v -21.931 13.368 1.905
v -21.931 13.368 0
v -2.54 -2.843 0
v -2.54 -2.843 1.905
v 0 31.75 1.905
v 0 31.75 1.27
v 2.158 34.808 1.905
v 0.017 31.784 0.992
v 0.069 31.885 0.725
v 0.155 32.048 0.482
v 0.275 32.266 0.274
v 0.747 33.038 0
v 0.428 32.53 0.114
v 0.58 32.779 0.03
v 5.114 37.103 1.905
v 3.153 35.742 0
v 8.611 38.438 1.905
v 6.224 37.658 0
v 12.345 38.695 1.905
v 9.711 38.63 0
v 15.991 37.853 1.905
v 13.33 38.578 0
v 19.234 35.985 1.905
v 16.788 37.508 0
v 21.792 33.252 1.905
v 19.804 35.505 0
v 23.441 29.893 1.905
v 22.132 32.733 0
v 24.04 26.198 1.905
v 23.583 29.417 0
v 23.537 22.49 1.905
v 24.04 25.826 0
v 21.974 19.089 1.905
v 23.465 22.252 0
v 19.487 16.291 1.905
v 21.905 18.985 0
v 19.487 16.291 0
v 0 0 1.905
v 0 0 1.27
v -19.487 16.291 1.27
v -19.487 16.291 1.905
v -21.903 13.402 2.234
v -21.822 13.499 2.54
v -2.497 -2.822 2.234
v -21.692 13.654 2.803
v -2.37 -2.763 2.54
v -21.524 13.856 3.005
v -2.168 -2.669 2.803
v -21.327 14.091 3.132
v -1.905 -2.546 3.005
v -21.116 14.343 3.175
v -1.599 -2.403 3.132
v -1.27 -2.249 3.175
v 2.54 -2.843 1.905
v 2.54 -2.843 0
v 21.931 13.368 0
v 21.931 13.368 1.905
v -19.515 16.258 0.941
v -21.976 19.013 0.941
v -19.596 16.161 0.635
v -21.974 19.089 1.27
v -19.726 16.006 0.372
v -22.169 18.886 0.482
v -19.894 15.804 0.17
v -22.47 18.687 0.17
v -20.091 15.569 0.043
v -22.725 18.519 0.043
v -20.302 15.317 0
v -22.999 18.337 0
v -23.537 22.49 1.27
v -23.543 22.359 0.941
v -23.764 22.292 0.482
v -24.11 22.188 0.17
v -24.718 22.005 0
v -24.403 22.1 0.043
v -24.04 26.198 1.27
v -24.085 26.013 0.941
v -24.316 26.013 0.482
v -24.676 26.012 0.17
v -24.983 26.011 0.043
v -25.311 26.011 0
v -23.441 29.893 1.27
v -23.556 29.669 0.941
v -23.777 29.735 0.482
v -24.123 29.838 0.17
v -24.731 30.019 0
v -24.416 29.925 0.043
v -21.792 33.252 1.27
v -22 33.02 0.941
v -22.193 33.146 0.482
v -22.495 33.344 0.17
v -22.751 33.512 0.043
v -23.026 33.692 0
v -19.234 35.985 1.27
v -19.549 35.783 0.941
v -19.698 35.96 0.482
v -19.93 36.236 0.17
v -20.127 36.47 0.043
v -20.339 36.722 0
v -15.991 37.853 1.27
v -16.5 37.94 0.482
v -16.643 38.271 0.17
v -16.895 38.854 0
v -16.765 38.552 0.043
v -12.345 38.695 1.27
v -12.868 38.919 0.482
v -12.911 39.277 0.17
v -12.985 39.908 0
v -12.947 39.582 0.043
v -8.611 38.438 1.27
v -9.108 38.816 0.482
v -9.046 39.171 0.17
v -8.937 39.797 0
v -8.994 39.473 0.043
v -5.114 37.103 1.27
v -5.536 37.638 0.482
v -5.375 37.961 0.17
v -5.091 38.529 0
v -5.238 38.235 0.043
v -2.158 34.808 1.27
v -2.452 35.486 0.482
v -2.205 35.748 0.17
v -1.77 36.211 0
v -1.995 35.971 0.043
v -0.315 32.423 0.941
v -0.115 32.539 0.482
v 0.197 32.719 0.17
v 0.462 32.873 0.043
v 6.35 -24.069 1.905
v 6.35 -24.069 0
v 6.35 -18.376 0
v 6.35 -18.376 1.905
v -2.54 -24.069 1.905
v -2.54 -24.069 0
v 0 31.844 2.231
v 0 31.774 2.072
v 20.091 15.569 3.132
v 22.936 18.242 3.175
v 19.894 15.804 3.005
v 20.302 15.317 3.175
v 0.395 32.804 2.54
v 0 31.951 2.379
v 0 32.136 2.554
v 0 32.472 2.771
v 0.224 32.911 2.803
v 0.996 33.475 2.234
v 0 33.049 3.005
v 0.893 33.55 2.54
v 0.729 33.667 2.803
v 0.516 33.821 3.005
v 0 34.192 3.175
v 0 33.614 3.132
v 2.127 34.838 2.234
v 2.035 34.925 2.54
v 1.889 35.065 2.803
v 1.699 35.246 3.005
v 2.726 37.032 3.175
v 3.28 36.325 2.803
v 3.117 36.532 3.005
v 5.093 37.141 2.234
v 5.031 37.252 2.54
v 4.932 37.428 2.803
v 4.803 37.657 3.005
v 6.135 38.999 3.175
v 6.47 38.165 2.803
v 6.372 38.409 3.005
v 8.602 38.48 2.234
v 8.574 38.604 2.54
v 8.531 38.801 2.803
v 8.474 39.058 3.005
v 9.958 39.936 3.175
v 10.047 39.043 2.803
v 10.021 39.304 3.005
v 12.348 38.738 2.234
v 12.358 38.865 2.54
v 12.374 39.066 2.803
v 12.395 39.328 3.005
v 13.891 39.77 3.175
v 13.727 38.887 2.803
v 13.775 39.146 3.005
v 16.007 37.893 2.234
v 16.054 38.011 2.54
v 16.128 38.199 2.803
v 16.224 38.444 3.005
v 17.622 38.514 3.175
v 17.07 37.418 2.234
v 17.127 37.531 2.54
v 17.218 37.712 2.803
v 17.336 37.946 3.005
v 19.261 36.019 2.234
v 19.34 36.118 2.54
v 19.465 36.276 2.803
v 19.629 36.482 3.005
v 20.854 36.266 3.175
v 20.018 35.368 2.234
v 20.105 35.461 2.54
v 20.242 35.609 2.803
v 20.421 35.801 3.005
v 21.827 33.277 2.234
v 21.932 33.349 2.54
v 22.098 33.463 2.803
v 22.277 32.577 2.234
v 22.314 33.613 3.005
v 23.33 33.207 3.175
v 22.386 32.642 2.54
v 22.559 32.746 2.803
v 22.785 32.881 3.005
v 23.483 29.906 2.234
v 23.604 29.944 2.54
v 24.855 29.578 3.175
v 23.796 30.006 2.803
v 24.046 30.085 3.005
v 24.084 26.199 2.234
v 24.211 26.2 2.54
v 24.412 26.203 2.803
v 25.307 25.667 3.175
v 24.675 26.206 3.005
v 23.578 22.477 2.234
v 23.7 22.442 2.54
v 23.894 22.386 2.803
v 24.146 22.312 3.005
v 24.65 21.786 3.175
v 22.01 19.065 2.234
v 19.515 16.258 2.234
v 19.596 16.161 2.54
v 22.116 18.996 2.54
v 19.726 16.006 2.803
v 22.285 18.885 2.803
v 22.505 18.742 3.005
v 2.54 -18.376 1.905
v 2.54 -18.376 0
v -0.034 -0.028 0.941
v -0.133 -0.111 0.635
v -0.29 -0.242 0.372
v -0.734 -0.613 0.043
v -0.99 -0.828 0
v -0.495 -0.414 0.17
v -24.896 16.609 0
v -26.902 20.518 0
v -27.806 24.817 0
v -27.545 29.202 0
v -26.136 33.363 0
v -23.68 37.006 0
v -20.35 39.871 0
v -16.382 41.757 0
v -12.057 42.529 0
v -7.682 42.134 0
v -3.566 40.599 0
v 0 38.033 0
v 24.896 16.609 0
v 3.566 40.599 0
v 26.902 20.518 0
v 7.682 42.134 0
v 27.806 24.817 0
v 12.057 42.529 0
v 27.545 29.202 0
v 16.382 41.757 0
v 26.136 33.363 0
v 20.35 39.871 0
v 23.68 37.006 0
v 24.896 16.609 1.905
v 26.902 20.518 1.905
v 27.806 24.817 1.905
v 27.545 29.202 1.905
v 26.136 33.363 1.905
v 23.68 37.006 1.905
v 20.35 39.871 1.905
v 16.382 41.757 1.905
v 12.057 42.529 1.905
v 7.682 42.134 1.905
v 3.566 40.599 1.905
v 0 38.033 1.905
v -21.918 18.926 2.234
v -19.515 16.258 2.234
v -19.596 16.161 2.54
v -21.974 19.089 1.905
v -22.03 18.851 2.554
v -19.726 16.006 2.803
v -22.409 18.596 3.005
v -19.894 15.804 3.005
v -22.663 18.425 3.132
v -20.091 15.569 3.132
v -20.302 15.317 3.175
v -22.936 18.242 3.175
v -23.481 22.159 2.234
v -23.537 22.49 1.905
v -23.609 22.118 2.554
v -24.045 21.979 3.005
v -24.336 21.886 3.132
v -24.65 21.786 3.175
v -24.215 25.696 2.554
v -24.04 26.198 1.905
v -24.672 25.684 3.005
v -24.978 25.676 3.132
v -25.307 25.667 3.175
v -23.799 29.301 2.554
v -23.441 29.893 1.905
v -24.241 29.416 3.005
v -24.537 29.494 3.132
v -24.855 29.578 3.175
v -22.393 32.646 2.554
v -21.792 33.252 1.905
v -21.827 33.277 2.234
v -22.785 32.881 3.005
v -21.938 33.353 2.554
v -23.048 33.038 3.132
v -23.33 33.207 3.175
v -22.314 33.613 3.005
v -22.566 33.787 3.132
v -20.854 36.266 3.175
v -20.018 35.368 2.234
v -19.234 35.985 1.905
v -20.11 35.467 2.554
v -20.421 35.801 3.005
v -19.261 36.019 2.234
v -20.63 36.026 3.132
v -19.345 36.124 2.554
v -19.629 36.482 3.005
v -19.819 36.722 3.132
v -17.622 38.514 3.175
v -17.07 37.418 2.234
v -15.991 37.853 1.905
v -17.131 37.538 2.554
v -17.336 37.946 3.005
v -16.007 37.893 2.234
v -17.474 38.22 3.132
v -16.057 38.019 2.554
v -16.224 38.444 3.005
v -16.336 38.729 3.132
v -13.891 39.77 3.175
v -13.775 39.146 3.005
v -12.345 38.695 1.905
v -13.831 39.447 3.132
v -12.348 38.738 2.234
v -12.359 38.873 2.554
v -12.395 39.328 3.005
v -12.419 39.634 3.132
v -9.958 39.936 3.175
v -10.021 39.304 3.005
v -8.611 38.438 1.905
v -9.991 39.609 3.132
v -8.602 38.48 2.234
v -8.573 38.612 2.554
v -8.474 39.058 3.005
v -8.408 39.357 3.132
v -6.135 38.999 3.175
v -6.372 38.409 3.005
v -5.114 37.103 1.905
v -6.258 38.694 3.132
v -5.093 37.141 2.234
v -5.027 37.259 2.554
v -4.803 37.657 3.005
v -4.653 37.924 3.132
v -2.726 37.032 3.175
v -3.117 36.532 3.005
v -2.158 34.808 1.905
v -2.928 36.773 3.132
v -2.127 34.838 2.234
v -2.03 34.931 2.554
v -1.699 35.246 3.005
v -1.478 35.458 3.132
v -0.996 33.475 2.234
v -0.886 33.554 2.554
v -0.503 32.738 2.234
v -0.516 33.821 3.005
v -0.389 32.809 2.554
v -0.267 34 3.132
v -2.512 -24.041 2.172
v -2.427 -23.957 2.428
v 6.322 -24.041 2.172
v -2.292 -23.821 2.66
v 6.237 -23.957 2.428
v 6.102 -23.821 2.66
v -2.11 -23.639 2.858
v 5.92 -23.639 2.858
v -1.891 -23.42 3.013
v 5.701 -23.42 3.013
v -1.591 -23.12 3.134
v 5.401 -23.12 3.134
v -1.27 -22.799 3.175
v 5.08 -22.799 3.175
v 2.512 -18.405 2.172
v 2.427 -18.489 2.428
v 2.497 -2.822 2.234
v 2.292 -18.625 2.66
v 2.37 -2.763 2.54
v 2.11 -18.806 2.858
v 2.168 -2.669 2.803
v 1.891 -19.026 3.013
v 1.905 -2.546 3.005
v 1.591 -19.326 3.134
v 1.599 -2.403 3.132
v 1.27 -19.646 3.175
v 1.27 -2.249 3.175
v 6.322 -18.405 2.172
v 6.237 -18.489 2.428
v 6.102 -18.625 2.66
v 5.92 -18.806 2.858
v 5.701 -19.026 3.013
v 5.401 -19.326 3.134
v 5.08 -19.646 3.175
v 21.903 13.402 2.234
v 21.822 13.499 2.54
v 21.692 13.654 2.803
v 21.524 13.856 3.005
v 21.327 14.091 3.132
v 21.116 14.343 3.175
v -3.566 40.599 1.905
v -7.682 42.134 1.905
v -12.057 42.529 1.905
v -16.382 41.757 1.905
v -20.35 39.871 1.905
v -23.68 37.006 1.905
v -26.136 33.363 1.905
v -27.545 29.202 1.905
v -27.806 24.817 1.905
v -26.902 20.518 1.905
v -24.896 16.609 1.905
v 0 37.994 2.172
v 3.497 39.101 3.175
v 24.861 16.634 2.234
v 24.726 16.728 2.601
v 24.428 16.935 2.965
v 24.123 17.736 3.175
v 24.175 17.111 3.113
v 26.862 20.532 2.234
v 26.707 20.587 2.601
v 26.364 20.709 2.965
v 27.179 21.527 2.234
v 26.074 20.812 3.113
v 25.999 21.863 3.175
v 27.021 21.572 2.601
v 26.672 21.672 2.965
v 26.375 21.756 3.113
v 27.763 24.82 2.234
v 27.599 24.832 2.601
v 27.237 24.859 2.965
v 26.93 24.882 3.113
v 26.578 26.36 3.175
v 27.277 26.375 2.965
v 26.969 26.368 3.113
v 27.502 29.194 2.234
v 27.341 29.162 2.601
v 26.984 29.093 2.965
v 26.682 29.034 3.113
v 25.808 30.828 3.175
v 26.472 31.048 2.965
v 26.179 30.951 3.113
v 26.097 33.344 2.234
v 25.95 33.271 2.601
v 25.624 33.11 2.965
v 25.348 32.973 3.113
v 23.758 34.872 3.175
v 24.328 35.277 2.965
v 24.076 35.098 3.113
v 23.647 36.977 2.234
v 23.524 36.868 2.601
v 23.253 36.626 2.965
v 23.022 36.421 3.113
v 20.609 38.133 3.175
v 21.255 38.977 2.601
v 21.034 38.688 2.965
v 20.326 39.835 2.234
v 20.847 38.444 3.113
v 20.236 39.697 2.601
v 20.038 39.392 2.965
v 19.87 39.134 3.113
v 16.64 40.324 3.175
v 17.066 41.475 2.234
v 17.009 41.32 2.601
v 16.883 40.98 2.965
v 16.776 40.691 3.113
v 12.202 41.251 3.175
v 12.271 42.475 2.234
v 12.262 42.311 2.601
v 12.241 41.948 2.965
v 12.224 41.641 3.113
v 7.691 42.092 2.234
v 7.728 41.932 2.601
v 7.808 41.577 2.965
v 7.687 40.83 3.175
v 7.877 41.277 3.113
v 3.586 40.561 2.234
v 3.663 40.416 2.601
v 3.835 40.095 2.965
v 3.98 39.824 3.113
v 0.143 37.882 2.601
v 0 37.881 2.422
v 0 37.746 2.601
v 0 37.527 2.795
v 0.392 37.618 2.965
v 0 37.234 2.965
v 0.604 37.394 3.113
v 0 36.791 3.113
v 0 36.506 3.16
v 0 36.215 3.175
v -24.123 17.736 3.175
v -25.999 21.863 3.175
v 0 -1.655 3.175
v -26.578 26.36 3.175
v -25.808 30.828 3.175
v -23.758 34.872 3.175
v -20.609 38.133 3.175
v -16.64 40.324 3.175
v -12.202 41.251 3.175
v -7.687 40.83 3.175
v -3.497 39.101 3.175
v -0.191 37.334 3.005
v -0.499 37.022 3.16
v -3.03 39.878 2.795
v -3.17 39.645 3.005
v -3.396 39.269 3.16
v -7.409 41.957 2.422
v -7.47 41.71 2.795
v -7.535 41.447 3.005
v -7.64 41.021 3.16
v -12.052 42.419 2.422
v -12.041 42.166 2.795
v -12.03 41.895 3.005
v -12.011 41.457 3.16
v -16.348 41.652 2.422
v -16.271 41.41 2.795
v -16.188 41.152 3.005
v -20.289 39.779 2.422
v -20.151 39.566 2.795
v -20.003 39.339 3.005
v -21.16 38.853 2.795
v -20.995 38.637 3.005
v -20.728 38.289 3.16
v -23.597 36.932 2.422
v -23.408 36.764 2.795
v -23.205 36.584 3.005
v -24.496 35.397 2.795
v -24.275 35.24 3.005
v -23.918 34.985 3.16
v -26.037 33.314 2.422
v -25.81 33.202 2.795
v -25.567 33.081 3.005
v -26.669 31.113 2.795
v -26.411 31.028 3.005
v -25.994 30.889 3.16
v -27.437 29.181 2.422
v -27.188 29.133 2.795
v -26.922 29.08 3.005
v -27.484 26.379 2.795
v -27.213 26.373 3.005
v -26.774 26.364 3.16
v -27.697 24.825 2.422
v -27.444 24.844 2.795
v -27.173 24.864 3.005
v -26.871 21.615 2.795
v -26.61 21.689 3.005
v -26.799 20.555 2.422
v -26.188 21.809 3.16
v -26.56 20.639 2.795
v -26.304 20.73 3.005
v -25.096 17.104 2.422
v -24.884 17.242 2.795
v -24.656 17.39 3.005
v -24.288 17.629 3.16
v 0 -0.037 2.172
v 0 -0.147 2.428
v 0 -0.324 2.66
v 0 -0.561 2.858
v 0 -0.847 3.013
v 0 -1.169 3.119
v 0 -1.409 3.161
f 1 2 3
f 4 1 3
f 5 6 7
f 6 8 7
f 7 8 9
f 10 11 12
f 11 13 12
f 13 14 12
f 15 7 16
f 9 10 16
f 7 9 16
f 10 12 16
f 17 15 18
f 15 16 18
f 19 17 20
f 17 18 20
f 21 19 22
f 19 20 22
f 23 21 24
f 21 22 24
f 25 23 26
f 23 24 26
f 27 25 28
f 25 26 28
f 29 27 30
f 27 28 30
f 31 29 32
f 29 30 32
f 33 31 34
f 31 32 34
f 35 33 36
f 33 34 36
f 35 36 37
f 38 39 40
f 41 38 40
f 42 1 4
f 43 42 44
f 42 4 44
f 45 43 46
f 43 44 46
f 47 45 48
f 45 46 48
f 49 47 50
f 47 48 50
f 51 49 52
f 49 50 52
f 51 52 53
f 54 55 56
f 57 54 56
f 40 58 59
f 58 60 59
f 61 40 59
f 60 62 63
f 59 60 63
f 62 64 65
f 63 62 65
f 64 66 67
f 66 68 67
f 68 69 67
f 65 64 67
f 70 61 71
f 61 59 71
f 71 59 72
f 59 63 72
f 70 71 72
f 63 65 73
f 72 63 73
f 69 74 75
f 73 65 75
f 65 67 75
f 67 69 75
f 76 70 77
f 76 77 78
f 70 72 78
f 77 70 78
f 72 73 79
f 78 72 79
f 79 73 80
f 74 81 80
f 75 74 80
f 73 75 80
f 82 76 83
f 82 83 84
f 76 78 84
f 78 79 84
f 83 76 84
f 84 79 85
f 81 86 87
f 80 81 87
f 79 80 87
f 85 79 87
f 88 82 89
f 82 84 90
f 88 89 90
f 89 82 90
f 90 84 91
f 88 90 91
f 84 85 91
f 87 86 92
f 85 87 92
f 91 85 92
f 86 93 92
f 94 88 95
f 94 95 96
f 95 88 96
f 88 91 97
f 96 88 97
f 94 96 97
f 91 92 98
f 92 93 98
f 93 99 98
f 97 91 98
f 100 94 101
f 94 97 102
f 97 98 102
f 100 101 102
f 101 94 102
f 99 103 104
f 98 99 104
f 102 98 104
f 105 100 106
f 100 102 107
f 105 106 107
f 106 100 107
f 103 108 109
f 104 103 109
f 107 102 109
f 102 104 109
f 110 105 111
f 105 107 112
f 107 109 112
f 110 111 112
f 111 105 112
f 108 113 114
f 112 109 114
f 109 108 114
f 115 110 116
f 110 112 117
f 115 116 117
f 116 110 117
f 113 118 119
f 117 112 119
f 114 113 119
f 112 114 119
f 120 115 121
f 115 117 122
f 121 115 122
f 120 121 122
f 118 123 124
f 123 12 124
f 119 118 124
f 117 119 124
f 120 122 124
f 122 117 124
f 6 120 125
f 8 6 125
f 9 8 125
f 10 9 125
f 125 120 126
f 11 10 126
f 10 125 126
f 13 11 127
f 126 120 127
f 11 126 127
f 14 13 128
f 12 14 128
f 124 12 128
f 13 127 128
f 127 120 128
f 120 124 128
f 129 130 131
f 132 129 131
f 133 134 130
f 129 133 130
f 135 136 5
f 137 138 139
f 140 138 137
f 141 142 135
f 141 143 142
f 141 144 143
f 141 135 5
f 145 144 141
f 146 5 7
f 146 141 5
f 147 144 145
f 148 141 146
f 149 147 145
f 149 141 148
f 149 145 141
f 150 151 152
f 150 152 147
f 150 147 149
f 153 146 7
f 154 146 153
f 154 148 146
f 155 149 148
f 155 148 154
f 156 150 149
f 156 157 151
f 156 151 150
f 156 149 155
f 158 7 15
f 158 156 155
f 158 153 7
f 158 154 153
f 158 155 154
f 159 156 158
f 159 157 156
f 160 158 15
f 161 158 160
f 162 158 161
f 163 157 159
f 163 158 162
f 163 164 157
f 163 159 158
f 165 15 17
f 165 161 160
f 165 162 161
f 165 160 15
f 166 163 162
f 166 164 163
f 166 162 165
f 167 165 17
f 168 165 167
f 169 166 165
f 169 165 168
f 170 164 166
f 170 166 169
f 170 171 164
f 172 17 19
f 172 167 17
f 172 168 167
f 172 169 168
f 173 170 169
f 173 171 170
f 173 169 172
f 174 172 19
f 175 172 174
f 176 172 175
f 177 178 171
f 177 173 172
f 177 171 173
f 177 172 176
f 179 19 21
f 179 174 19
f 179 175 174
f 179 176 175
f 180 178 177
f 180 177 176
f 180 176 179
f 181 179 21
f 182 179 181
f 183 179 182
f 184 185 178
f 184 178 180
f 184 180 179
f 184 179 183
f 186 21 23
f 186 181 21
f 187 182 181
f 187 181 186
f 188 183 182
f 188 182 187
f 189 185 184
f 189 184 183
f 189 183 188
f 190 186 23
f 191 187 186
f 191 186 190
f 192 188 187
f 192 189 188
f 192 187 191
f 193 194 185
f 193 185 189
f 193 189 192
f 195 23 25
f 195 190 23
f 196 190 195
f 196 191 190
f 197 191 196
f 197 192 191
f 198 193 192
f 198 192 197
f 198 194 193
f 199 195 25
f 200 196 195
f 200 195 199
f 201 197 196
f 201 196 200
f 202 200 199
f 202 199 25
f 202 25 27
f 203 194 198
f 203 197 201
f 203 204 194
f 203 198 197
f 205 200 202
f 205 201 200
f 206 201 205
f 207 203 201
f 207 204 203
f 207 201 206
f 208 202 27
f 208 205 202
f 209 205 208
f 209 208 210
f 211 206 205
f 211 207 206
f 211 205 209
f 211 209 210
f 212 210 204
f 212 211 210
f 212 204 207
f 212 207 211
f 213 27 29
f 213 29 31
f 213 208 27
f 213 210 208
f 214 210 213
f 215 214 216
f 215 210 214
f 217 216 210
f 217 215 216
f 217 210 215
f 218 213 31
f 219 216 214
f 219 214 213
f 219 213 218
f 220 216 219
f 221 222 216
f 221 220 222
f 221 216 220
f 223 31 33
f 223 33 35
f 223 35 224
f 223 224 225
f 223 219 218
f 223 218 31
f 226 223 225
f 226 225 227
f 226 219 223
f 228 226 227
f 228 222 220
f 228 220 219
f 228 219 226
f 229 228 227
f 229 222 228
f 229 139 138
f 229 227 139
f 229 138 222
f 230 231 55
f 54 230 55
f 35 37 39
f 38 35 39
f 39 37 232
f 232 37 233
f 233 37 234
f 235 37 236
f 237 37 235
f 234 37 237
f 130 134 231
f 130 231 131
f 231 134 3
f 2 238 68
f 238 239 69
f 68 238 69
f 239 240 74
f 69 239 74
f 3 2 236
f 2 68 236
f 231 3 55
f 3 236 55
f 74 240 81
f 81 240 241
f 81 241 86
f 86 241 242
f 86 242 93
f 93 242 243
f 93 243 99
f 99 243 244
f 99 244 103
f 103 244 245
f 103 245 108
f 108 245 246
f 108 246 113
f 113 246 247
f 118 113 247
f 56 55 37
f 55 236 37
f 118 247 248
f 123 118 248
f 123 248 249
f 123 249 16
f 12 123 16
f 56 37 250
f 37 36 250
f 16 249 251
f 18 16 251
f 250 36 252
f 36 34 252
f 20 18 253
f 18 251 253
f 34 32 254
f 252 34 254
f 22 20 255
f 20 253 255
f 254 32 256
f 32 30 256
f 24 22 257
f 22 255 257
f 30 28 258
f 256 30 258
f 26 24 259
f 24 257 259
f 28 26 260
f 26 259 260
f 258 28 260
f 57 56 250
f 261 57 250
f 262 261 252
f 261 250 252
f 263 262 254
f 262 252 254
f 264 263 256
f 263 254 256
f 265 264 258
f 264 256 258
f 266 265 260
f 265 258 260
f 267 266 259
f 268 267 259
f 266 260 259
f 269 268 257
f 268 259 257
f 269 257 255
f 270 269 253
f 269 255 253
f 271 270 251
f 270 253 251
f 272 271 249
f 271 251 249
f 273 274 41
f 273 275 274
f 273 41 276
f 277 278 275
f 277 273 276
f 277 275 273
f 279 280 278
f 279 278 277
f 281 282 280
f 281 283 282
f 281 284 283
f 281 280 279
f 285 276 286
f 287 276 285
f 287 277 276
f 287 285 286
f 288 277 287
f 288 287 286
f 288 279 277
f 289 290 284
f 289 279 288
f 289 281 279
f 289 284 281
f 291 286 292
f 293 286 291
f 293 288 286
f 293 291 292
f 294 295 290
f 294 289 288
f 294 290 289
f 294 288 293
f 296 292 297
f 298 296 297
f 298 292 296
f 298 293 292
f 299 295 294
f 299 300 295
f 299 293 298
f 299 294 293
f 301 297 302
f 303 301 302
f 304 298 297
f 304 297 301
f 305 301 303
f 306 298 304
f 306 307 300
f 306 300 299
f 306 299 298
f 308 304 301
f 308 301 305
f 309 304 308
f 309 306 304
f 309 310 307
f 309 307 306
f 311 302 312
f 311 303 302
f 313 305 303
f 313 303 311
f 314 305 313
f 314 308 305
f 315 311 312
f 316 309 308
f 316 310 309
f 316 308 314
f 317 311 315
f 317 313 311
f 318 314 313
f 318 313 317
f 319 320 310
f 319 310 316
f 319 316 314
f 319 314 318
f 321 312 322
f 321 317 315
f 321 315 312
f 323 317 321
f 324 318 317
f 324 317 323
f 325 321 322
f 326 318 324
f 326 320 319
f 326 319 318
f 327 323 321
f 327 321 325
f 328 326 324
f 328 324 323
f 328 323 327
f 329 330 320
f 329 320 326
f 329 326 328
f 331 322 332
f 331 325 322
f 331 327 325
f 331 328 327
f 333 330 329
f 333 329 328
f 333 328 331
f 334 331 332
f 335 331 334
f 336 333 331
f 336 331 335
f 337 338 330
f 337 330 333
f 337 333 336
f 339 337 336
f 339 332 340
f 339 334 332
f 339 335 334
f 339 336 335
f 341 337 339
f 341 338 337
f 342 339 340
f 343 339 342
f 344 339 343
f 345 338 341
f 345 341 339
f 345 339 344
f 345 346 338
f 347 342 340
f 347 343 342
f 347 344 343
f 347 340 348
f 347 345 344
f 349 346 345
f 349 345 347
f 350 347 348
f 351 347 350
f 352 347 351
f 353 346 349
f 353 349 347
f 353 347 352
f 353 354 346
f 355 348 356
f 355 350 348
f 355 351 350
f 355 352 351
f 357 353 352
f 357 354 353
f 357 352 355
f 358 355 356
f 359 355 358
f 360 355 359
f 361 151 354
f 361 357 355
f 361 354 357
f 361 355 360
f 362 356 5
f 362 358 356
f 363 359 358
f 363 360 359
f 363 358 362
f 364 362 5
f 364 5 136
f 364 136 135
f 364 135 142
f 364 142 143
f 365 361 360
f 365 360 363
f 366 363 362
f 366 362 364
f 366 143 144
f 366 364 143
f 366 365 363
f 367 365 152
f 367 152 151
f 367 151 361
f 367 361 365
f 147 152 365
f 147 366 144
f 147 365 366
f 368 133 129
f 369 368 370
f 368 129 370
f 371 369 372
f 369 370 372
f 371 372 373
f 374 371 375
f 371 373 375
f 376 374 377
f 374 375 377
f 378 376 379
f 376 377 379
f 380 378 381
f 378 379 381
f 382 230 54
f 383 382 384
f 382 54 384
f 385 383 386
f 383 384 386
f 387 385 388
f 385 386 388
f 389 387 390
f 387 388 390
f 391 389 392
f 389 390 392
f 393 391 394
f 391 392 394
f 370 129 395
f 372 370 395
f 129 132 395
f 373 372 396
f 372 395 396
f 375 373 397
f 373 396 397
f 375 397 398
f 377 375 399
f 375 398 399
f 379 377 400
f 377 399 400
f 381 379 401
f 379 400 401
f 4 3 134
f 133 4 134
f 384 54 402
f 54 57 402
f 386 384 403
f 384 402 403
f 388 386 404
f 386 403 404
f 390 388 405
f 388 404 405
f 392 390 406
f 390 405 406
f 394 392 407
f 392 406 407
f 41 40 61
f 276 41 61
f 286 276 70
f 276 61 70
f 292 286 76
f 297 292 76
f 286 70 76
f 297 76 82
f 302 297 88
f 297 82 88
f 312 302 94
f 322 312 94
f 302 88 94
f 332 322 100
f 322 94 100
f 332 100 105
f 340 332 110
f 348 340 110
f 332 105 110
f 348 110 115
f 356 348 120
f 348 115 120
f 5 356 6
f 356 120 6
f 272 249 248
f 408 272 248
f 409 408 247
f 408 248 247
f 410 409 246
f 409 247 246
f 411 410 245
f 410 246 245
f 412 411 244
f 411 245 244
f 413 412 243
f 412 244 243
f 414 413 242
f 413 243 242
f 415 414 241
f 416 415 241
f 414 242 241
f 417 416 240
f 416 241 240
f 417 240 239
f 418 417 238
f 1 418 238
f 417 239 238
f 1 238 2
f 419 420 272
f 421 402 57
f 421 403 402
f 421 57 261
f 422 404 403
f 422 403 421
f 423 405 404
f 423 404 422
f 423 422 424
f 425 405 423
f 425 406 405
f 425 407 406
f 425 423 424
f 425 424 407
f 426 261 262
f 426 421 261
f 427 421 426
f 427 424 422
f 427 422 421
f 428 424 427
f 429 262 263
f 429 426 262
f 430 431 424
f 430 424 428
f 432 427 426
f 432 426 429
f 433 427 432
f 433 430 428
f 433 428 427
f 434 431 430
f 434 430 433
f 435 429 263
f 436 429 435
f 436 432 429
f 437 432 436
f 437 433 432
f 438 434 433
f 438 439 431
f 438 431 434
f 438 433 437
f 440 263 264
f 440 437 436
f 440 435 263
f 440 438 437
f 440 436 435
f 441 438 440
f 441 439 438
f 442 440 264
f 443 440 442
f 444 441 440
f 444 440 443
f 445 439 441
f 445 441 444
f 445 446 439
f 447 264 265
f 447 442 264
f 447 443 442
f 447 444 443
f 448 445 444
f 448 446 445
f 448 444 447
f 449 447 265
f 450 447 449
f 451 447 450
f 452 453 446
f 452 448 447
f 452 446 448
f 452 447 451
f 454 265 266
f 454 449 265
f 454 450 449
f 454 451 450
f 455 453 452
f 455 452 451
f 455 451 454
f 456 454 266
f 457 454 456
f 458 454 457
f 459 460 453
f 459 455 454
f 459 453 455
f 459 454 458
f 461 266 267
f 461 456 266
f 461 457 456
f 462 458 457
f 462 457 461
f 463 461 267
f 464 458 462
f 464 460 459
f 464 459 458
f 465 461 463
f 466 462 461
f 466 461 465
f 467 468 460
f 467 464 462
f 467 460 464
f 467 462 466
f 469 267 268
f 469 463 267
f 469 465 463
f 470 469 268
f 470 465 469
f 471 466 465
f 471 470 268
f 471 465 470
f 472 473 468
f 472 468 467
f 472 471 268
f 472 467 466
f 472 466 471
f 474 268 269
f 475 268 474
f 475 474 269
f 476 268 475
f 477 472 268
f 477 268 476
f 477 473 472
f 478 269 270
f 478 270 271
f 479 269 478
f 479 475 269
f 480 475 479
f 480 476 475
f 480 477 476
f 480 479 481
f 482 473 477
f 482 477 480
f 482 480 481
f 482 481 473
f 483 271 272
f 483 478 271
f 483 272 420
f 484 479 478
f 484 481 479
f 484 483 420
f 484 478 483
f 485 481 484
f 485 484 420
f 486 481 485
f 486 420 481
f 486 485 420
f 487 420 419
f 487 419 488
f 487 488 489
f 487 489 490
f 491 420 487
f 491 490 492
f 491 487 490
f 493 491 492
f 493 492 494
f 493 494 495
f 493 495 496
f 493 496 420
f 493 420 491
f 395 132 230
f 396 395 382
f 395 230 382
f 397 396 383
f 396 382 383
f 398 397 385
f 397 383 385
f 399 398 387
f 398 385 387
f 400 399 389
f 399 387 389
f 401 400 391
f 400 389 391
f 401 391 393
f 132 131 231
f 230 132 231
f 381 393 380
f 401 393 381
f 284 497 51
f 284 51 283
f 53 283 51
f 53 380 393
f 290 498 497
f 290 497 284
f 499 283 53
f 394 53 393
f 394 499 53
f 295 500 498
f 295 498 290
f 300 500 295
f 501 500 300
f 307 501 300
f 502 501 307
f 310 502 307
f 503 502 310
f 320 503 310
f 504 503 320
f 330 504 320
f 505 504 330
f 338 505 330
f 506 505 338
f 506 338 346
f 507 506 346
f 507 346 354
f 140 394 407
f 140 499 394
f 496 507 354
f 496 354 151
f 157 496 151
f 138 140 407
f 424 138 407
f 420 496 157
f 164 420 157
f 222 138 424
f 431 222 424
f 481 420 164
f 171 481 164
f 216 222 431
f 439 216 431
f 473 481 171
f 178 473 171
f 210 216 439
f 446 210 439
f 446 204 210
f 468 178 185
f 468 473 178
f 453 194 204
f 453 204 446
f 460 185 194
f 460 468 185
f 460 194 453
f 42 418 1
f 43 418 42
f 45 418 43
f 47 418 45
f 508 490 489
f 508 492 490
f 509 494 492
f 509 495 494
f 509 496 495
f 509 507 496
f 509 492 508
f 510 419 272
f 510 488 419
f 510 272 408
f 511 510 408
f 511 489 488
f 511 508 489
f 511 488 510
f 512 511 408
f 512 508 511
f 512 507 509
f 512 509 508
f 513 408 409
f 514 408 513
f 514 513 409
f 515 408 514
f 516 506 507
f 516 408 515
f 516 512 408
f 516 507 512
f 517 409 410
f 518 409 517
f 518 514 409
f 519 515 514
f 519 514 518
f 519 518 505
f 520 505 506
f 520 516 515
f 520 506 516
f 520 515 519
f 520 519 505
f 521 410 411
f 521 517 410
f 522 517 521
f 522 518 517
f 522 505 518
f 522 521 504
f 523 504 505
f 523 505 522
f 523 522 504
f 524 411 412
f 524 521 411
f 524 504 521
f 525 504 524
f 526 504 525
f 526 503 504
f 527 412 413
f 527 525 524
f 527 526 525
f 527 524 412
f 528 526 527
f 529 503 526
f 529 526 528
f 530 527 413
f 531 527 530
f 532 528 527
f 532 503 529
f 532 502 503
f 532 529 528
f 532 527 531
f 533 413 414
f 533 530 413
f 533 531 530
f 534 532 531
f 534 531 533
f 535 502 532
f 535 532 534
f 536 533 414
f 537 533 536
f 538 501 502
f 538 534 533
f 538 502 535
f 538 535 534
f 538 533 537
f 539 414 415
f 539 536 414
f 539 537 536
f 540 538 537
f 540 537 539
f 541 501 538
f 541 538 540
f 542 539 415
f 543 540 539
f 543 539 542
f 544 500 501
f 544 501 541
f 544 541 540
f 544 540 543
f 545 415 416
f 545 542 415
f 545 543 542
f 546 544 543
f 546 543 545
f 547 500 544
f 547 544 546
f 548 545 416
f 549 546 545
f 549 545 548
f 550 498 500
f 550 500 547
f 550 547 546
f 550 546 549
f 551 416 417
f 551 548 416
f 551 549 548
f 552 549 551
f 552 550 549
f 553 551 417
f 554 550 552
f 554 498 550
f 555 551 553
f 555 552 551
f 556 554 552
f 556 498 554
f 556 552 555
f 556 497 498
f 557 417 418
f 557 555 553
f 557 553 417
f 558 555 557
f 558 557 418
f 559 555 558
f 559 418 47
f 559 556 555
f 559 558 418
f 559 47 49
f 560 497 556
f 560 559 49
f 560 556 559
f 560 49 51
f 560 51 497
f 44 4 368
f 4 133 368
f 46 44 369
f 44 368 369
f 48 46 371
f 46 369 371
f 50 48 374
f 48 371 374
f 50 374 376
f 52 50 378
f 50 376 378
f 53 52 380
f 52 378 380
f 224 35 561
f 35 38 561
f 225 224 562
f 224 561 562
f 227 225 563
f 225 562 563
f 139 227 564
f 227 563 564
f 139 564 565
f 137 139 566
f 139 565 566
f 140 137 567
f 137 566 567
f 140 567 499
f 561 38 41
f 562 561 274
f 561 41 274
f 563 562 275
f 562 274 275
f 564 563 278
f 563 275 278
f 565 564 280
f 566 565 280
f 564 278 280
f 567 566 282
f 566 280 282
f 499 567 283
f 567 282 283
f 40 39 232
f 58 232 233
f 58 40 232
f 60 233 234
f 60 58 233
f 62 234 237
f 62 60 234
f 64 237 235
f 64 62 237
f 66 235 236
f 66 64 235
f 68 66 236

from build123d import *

# Parameters (mm, degrees)
F1_DEPTH = 3.175
F2_R     = 1.27


with BuildPart() as f1:
    # F0 (on Top) → F1 (new body)
    with BuildSketch(Plane.XY):
        with BuildLine():
            Line((-21.930882, 13.368339), (-2.54, -2.842578))
            Line((-2.54, -2.842578), (-2.54, -18.3762))
            Line((-2.54, -18.3762), (-2.54, -24.069088))
            Line((-2.54, -24.069088), (2.54, -24.069088))
            Line((2.54, -24.069088), (6.35, -24.069088))
            Line((6.35, -24.069088), (6.35, -18.3762))
            Line((6.35, -18.3762), (2.54, -18.3762))
            Line((2.54, -18.3762), (2.54, -2.842578))
            Line((2.54, -2.842578), (21.930882, 13.368339))
            ThreePointArc((21.930882, 13.368339), (23.67951, 37.005537), (0, 38.032972))
            ThreePointArc((0, 38.032972), (-23.67951, 37.005537), (-21.930882, 13.368339))
        make_face()
        with BuildLine():
            Line((19.48717, 16.291415), (0, 0))
            Line((0, 0), (-19.48717, 16.291415))
            ThreePointArc((-19.48717, 16.291415), (-19.234192, 35.984614), (0, 31.75))
            ThreePointArc((0, 31.75), (19.234192, 35.984614), (19.48717, 16.291415))
        make_face(mode=Mode.SUBTRACT)
    extrude(amount=F1_DEPTH)

    # F2
    f2_edges = [f1.edges().sort_by_distance(p)[0] for p in [
        (-12.235441, 5.262881, 3.175),
        (-23.67951, 37.005537, 3.175),
        (23.67951, 37.005537, 3.175),
        (12.235441, 5.262881, 3.175),
        (-2.54, -13.455833, 3.175),
        (2.54, -10.609389, 3.175),
        (-9.743585, 8.145707, 0),
        (-19.234192, 35.984614, 3.175),
        (19.234192, 35.984614, 3.175),
        (4.445, -18.3762, 3.175),
        (6.35, -21.222644, 3.175),
        (1.905, -24.069088, 3.175),
    ]]
    fillet(f2_edges, radius=F2_R)


solid = f1.part
